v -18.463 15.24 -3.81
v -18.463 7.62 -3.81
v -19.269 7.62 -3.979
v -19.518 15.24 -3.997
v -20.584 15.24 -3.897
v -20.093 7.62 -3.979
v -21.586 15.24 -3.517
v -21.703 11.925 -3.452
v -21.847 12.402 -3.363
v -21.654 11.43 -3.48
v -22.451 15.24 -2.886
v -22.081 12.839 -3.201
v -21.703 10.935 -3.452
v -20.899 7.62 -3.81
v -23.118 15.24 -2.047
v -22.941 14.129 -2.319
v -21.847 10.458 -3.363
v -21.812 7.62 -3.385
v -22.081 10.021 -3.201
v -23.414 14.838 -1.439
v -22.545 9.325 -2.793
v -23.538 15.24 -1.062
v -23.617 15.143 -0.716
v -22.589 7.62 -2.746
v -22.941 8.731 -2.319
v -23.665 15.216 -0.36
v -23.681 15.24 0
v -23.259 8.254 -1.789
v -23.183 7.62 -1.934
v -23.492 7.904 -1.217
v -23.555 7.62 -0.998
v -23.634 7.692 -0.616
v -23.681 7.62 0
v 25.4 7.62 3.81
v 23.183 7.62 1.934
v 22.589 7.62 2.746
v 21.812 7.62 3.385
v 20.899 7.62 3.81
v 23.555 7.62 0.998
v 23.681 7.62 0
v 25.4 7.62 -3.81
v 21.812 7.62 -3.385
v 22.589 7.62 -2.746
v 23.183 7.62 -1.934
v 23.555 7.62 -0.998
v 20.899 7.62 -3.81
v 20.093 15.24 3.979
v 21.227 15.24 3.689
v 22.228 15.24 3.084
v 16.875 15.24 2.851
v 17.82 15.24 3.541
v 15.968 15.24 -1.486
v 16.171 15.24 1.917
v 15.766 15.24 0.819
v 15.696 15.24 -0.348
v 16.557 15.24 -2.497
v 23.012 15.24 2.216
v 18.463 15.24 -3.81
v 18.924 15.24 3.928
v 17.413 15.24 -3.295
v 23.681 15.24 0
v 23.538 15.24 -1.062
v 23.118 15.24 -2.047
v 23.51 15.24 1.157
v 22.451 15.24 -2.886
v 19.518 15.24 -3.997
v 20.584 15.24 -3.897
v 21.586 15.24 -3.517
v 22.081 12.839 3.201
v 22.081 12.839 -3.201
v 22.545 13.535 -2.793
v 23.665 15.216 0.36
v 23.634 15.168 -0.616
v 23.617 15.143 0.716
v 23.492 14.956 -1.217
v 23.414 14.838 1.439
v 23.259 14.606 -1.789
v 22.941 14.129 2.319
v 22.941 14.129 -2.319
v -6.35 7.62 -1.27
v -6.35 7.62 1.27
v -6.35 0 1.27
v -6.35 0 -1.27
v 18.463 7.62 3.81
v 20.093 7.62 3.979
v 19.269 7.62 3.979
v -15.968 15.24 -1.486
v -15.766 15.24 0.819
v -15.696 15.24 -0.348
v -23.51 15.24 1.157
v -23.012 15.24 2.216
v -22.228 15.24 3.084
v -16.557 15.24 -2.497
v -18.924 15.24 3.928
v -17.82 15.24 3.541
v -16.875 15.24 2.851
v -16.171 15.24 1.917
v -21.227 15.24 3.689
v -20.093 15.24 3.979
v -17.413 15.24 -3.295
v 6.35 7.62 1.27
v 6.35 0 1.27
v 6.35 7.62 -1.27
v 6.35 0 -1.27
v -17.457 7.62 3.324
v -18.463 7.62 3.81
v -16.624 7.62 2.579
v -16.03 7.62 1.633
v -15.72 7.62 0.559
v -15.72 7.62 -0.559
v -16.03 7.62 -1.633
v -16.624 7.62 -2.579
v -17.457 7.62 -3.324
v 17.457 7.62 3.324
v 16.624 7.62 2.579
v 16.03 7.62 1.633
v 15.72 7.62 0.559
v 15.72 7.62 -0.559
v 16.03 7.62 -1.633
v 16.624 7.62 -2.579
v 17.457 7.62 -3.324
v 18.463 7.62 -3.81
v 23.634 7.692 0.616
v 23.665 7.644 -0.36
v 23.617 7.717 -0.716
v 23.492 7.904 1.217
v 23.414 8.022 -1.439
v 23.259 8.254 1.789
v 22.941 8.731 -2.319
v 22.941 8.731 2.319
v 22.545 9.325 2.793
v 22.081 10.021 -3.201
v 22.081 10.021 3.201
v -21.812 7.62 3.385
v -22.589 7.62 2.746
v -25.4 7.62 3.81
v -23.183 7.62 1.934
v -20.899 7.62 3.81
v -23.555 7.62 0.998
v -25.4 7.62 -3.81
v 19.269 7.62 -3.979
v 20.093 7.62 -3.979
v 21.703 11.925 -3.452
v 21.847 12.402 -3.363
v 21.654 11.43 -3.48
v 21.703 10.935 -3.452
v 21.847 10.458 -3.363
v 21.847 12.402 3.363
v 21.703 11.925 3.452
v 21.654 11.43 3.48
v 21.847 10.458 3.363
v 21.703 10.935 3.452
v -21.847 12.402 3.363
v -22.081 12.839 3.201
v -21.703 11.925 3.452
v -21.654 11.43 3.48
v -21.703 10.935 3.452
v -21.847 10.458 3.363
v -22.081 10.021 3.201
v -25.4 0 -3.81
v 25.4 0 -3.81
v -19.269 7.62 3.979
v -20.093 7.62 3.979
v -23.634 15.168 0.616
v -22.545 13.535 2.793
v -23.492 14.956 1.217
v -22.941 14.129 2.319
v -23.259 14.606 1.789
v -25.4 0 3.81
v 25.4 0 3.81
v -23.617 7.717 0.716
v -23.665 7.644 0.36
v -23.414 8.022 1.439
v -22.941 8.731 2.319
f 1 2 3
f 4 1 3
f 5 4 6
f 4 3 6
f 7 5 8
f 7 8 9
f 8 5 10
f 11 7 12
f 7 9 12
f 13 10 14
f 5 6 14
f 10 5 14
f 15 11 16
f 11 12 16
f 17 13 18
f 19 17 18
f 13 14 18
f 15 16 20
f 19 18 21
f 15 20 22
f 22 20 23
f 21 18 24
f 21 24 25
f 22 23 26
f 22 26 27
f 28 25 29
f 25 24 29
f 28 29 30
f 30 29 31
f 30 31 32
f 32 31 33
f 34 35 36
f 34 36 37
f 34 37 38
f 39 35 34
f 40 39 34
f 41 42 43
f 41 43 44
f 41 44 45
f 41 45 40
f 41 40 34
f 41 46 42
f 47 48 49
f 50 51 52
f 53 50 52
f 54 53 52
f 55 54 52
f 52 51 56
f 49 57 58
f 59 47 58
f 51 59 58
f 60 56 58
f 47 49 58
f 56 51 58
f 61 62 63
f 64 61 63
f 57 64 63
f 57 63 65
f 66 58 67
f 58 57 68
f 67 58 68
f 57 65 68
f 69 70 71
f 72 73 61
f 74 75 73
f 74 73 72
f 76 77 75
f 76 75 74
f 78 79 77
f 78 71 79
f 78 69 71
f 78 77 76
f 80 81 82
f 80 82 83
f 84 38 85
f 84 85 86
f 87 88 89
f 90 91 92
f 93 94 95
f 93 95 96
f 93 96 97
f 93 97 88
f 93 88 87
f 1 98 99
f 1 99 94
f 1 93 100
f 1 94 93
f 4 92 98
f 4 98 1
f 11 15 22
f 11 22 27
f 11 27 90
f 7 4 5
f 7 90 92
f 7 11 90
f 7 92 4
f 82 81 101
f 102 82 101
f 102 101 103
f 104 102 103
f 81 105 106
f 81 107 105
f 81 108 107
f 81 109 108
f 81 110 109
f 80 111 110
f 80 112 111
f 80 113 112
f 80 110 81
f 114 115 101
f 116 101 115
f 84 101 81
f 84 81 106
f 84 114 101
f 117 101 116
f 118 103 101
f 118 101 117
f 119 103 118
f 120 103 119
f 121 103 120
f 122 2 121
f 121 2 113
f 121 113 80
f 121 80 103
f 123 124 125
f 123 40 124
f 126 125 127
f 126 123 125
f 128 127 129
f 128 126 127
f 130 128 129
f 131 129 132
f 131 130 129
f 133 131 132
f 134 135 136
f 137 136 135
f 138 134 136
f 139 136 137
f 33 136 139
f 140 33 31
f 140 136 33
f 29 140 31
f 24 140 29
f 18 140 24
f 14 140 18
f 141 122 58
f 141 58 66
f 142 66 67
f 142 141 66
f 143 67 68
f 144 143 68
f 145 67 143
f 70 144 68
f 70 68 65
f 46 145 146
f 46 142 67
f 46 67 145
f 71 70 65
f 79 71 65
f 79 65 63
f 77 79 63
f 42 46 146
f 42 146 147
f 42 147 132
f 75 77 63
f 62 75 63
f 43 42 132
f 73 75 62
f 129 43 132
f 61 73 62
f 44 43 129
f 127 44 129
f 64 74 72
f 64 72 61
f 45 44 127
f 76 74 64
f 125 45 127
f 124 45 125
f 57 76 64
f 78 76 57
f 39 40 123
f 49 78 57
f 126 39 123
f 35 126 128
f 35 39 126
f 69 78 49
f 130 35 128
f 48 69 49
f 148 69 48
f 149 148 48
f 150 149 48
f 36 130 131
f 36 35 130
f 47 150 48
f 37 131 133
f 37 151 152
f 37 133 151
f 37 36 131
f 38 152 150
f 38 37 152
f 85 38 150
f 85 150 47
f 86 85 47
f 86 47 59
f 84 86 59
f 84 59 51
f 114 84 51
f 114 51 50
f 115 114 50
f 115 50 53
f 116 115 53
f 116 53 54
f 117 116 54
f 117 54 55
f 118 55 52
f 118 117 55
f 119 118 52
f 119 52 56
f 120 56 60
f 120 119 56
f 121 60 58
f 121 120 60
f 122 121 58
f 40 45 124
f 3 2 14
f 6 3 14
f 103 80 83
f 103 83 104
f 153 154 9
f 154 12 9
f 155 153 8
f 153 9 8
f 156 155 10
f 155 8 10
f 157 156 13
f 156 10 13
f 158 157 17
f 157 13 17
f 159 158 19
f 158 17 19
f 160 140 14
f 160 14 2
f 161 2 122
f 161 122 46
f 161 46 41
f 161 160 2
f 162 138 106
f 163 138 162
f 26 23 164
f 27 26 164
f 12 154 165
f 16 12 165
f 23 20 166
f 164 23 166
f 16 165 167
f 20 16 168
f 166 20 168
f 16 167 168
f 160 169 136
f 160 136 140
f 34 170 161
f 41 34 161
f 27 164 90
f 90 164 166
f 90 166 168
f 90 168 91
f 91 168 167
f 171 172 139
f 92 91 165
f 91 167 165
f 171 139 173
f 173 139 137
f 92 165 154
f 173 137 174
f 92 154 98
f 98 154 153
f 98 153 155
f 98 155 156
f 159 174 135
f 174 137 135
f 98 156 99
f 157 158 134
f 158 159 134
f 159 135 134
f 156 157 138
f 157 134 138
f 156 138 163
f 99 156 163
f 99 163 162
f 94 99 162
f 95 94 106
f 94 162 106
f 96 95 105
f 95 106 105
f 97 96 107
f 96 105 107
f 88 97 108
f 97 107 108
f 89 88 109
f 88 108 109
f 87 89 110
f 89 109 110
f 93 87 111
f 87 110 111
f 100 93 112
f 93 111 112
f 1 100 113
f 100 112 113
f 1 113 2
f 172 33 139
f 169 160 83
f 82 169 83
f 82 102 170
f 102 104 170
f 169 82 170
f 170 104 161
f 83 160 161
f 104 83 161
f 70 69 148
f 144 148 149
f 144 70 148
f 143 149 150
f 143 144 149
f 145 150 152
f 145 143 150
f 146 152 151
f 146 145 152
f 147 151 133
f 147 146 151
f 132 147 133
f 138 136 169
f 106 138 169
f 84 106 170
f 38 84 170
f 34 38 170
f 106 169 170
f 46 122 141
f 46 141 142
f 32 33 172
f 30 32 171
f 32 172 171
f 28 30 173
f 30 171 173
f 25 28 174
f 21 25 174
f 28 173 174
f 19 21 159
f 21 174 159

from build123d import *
from build123d.topology import SkipClean

# Parameters (mm, degrees)
SKETCH1_W            = 50.8
SKETCH1_H            = 7.62
BOSS_EXTRUDE1_DEPTH  = 7.62
SKETCH2_W            = 12.7
SKETCH2_H            = 2.54
CUT_EXTRUDE1_DEPTH   = 27.790679349
SKETCH3_R            = 4
BOSS_EXTRUDE2_DEPTH  = 7.62
CUT_EXTRUDE2_DEPTH   = 7.62
FILLET1_R            = 2.54
FILLET1_OF_MIRROR1_R = 2.54


with BuildPart() as part:
    # Sketch1 → Boss-Extrude1 (new body)
    with BuildSketch(Plane(origin=(0, 0, 0), x_dir=(1, 0, 0), z_dir=(0, 1, 0))):
        Rectangle(SKETCH1_W, SKETCH1_H)
    extrude(amount=BOSS_EXTRUDE1_DEPTH)

    # Sketch2 → Cut-Extrude1 (cut, through all)
    with BuildSketch(Plane(origin=(0, 7.62, 0), x_dir=(1, 0, 0), z_dir=(0, 1, 0))):
        Rectangle(SKETCH2_W, SKETCH2_H)
    extrude(amount=-CUT_EXTRUDE1_DEPTH, mode=Mode.SUBTRACT)

    # Sketch3 → Boss-Extrude2 (add)
    with BuildSketch(Plane(origin=(0, 7.62, 0), x_dir=(1, 0, 0), z_dir=(0, 1, 0))):
        with Locations(Location((-19.681240592, 0, 0), (0, 0, 72.269593739))):
            Circle(SKETCH3_R)
    boss_extrude2 = extrude(amount=BOSS_EXTRUDE2_DEPTH)

    # Sketch4 → Cut-Extrude2 (cut, symmetric)
    with SkipClean():  # the faces are left unmerged after this step: merging them gives an invalid solid
        with BuildSketch(Plane.XY):
            Polygon((-23.681240592, 15.24), (-23.681240592, 7.62), (-21.141240592, 11.43), align=None)
        cut_extrude2 = extrude(amount=CUT_EXTRUDE2_DEPTH, both=True, mode=Mode.SUBTRACT)

    # Fillet1
    fillet1_edges = [part.edges().sort_by_distance(p)[0] for p in [
        (-21.141240592, 11.43, 0),
    ]]
    fillet(fillet1_edges, radius=FILLET1_R)

    # Mirror1: Boss-Extrude2, Cut-Extrude2 across plane
    add(boss_extrude2.mirror(Plane(origin=(0, 0, 0), x_dir=(0, 0, 1), z_dir=(1, 0, 0))))
    add(cut_extrude2.mirror(Plane(origin=(0, 0, 0), x_dir=(0, 0, 1), z_dir=(1, 0, 0))), mode=Mode.SUBTRACT)

    # Fillet1 of Mirror1
    fillet1_of_mirror1_edges = [part.edges().sort_by_distance(p)[0] for p in [
        (21.141240592, 11.43, 0),
    ]]
    fillet(fillet1_of_mirror1_edges, radius=FILLET1_OF_MIRROR1_R)


solid = part.part
